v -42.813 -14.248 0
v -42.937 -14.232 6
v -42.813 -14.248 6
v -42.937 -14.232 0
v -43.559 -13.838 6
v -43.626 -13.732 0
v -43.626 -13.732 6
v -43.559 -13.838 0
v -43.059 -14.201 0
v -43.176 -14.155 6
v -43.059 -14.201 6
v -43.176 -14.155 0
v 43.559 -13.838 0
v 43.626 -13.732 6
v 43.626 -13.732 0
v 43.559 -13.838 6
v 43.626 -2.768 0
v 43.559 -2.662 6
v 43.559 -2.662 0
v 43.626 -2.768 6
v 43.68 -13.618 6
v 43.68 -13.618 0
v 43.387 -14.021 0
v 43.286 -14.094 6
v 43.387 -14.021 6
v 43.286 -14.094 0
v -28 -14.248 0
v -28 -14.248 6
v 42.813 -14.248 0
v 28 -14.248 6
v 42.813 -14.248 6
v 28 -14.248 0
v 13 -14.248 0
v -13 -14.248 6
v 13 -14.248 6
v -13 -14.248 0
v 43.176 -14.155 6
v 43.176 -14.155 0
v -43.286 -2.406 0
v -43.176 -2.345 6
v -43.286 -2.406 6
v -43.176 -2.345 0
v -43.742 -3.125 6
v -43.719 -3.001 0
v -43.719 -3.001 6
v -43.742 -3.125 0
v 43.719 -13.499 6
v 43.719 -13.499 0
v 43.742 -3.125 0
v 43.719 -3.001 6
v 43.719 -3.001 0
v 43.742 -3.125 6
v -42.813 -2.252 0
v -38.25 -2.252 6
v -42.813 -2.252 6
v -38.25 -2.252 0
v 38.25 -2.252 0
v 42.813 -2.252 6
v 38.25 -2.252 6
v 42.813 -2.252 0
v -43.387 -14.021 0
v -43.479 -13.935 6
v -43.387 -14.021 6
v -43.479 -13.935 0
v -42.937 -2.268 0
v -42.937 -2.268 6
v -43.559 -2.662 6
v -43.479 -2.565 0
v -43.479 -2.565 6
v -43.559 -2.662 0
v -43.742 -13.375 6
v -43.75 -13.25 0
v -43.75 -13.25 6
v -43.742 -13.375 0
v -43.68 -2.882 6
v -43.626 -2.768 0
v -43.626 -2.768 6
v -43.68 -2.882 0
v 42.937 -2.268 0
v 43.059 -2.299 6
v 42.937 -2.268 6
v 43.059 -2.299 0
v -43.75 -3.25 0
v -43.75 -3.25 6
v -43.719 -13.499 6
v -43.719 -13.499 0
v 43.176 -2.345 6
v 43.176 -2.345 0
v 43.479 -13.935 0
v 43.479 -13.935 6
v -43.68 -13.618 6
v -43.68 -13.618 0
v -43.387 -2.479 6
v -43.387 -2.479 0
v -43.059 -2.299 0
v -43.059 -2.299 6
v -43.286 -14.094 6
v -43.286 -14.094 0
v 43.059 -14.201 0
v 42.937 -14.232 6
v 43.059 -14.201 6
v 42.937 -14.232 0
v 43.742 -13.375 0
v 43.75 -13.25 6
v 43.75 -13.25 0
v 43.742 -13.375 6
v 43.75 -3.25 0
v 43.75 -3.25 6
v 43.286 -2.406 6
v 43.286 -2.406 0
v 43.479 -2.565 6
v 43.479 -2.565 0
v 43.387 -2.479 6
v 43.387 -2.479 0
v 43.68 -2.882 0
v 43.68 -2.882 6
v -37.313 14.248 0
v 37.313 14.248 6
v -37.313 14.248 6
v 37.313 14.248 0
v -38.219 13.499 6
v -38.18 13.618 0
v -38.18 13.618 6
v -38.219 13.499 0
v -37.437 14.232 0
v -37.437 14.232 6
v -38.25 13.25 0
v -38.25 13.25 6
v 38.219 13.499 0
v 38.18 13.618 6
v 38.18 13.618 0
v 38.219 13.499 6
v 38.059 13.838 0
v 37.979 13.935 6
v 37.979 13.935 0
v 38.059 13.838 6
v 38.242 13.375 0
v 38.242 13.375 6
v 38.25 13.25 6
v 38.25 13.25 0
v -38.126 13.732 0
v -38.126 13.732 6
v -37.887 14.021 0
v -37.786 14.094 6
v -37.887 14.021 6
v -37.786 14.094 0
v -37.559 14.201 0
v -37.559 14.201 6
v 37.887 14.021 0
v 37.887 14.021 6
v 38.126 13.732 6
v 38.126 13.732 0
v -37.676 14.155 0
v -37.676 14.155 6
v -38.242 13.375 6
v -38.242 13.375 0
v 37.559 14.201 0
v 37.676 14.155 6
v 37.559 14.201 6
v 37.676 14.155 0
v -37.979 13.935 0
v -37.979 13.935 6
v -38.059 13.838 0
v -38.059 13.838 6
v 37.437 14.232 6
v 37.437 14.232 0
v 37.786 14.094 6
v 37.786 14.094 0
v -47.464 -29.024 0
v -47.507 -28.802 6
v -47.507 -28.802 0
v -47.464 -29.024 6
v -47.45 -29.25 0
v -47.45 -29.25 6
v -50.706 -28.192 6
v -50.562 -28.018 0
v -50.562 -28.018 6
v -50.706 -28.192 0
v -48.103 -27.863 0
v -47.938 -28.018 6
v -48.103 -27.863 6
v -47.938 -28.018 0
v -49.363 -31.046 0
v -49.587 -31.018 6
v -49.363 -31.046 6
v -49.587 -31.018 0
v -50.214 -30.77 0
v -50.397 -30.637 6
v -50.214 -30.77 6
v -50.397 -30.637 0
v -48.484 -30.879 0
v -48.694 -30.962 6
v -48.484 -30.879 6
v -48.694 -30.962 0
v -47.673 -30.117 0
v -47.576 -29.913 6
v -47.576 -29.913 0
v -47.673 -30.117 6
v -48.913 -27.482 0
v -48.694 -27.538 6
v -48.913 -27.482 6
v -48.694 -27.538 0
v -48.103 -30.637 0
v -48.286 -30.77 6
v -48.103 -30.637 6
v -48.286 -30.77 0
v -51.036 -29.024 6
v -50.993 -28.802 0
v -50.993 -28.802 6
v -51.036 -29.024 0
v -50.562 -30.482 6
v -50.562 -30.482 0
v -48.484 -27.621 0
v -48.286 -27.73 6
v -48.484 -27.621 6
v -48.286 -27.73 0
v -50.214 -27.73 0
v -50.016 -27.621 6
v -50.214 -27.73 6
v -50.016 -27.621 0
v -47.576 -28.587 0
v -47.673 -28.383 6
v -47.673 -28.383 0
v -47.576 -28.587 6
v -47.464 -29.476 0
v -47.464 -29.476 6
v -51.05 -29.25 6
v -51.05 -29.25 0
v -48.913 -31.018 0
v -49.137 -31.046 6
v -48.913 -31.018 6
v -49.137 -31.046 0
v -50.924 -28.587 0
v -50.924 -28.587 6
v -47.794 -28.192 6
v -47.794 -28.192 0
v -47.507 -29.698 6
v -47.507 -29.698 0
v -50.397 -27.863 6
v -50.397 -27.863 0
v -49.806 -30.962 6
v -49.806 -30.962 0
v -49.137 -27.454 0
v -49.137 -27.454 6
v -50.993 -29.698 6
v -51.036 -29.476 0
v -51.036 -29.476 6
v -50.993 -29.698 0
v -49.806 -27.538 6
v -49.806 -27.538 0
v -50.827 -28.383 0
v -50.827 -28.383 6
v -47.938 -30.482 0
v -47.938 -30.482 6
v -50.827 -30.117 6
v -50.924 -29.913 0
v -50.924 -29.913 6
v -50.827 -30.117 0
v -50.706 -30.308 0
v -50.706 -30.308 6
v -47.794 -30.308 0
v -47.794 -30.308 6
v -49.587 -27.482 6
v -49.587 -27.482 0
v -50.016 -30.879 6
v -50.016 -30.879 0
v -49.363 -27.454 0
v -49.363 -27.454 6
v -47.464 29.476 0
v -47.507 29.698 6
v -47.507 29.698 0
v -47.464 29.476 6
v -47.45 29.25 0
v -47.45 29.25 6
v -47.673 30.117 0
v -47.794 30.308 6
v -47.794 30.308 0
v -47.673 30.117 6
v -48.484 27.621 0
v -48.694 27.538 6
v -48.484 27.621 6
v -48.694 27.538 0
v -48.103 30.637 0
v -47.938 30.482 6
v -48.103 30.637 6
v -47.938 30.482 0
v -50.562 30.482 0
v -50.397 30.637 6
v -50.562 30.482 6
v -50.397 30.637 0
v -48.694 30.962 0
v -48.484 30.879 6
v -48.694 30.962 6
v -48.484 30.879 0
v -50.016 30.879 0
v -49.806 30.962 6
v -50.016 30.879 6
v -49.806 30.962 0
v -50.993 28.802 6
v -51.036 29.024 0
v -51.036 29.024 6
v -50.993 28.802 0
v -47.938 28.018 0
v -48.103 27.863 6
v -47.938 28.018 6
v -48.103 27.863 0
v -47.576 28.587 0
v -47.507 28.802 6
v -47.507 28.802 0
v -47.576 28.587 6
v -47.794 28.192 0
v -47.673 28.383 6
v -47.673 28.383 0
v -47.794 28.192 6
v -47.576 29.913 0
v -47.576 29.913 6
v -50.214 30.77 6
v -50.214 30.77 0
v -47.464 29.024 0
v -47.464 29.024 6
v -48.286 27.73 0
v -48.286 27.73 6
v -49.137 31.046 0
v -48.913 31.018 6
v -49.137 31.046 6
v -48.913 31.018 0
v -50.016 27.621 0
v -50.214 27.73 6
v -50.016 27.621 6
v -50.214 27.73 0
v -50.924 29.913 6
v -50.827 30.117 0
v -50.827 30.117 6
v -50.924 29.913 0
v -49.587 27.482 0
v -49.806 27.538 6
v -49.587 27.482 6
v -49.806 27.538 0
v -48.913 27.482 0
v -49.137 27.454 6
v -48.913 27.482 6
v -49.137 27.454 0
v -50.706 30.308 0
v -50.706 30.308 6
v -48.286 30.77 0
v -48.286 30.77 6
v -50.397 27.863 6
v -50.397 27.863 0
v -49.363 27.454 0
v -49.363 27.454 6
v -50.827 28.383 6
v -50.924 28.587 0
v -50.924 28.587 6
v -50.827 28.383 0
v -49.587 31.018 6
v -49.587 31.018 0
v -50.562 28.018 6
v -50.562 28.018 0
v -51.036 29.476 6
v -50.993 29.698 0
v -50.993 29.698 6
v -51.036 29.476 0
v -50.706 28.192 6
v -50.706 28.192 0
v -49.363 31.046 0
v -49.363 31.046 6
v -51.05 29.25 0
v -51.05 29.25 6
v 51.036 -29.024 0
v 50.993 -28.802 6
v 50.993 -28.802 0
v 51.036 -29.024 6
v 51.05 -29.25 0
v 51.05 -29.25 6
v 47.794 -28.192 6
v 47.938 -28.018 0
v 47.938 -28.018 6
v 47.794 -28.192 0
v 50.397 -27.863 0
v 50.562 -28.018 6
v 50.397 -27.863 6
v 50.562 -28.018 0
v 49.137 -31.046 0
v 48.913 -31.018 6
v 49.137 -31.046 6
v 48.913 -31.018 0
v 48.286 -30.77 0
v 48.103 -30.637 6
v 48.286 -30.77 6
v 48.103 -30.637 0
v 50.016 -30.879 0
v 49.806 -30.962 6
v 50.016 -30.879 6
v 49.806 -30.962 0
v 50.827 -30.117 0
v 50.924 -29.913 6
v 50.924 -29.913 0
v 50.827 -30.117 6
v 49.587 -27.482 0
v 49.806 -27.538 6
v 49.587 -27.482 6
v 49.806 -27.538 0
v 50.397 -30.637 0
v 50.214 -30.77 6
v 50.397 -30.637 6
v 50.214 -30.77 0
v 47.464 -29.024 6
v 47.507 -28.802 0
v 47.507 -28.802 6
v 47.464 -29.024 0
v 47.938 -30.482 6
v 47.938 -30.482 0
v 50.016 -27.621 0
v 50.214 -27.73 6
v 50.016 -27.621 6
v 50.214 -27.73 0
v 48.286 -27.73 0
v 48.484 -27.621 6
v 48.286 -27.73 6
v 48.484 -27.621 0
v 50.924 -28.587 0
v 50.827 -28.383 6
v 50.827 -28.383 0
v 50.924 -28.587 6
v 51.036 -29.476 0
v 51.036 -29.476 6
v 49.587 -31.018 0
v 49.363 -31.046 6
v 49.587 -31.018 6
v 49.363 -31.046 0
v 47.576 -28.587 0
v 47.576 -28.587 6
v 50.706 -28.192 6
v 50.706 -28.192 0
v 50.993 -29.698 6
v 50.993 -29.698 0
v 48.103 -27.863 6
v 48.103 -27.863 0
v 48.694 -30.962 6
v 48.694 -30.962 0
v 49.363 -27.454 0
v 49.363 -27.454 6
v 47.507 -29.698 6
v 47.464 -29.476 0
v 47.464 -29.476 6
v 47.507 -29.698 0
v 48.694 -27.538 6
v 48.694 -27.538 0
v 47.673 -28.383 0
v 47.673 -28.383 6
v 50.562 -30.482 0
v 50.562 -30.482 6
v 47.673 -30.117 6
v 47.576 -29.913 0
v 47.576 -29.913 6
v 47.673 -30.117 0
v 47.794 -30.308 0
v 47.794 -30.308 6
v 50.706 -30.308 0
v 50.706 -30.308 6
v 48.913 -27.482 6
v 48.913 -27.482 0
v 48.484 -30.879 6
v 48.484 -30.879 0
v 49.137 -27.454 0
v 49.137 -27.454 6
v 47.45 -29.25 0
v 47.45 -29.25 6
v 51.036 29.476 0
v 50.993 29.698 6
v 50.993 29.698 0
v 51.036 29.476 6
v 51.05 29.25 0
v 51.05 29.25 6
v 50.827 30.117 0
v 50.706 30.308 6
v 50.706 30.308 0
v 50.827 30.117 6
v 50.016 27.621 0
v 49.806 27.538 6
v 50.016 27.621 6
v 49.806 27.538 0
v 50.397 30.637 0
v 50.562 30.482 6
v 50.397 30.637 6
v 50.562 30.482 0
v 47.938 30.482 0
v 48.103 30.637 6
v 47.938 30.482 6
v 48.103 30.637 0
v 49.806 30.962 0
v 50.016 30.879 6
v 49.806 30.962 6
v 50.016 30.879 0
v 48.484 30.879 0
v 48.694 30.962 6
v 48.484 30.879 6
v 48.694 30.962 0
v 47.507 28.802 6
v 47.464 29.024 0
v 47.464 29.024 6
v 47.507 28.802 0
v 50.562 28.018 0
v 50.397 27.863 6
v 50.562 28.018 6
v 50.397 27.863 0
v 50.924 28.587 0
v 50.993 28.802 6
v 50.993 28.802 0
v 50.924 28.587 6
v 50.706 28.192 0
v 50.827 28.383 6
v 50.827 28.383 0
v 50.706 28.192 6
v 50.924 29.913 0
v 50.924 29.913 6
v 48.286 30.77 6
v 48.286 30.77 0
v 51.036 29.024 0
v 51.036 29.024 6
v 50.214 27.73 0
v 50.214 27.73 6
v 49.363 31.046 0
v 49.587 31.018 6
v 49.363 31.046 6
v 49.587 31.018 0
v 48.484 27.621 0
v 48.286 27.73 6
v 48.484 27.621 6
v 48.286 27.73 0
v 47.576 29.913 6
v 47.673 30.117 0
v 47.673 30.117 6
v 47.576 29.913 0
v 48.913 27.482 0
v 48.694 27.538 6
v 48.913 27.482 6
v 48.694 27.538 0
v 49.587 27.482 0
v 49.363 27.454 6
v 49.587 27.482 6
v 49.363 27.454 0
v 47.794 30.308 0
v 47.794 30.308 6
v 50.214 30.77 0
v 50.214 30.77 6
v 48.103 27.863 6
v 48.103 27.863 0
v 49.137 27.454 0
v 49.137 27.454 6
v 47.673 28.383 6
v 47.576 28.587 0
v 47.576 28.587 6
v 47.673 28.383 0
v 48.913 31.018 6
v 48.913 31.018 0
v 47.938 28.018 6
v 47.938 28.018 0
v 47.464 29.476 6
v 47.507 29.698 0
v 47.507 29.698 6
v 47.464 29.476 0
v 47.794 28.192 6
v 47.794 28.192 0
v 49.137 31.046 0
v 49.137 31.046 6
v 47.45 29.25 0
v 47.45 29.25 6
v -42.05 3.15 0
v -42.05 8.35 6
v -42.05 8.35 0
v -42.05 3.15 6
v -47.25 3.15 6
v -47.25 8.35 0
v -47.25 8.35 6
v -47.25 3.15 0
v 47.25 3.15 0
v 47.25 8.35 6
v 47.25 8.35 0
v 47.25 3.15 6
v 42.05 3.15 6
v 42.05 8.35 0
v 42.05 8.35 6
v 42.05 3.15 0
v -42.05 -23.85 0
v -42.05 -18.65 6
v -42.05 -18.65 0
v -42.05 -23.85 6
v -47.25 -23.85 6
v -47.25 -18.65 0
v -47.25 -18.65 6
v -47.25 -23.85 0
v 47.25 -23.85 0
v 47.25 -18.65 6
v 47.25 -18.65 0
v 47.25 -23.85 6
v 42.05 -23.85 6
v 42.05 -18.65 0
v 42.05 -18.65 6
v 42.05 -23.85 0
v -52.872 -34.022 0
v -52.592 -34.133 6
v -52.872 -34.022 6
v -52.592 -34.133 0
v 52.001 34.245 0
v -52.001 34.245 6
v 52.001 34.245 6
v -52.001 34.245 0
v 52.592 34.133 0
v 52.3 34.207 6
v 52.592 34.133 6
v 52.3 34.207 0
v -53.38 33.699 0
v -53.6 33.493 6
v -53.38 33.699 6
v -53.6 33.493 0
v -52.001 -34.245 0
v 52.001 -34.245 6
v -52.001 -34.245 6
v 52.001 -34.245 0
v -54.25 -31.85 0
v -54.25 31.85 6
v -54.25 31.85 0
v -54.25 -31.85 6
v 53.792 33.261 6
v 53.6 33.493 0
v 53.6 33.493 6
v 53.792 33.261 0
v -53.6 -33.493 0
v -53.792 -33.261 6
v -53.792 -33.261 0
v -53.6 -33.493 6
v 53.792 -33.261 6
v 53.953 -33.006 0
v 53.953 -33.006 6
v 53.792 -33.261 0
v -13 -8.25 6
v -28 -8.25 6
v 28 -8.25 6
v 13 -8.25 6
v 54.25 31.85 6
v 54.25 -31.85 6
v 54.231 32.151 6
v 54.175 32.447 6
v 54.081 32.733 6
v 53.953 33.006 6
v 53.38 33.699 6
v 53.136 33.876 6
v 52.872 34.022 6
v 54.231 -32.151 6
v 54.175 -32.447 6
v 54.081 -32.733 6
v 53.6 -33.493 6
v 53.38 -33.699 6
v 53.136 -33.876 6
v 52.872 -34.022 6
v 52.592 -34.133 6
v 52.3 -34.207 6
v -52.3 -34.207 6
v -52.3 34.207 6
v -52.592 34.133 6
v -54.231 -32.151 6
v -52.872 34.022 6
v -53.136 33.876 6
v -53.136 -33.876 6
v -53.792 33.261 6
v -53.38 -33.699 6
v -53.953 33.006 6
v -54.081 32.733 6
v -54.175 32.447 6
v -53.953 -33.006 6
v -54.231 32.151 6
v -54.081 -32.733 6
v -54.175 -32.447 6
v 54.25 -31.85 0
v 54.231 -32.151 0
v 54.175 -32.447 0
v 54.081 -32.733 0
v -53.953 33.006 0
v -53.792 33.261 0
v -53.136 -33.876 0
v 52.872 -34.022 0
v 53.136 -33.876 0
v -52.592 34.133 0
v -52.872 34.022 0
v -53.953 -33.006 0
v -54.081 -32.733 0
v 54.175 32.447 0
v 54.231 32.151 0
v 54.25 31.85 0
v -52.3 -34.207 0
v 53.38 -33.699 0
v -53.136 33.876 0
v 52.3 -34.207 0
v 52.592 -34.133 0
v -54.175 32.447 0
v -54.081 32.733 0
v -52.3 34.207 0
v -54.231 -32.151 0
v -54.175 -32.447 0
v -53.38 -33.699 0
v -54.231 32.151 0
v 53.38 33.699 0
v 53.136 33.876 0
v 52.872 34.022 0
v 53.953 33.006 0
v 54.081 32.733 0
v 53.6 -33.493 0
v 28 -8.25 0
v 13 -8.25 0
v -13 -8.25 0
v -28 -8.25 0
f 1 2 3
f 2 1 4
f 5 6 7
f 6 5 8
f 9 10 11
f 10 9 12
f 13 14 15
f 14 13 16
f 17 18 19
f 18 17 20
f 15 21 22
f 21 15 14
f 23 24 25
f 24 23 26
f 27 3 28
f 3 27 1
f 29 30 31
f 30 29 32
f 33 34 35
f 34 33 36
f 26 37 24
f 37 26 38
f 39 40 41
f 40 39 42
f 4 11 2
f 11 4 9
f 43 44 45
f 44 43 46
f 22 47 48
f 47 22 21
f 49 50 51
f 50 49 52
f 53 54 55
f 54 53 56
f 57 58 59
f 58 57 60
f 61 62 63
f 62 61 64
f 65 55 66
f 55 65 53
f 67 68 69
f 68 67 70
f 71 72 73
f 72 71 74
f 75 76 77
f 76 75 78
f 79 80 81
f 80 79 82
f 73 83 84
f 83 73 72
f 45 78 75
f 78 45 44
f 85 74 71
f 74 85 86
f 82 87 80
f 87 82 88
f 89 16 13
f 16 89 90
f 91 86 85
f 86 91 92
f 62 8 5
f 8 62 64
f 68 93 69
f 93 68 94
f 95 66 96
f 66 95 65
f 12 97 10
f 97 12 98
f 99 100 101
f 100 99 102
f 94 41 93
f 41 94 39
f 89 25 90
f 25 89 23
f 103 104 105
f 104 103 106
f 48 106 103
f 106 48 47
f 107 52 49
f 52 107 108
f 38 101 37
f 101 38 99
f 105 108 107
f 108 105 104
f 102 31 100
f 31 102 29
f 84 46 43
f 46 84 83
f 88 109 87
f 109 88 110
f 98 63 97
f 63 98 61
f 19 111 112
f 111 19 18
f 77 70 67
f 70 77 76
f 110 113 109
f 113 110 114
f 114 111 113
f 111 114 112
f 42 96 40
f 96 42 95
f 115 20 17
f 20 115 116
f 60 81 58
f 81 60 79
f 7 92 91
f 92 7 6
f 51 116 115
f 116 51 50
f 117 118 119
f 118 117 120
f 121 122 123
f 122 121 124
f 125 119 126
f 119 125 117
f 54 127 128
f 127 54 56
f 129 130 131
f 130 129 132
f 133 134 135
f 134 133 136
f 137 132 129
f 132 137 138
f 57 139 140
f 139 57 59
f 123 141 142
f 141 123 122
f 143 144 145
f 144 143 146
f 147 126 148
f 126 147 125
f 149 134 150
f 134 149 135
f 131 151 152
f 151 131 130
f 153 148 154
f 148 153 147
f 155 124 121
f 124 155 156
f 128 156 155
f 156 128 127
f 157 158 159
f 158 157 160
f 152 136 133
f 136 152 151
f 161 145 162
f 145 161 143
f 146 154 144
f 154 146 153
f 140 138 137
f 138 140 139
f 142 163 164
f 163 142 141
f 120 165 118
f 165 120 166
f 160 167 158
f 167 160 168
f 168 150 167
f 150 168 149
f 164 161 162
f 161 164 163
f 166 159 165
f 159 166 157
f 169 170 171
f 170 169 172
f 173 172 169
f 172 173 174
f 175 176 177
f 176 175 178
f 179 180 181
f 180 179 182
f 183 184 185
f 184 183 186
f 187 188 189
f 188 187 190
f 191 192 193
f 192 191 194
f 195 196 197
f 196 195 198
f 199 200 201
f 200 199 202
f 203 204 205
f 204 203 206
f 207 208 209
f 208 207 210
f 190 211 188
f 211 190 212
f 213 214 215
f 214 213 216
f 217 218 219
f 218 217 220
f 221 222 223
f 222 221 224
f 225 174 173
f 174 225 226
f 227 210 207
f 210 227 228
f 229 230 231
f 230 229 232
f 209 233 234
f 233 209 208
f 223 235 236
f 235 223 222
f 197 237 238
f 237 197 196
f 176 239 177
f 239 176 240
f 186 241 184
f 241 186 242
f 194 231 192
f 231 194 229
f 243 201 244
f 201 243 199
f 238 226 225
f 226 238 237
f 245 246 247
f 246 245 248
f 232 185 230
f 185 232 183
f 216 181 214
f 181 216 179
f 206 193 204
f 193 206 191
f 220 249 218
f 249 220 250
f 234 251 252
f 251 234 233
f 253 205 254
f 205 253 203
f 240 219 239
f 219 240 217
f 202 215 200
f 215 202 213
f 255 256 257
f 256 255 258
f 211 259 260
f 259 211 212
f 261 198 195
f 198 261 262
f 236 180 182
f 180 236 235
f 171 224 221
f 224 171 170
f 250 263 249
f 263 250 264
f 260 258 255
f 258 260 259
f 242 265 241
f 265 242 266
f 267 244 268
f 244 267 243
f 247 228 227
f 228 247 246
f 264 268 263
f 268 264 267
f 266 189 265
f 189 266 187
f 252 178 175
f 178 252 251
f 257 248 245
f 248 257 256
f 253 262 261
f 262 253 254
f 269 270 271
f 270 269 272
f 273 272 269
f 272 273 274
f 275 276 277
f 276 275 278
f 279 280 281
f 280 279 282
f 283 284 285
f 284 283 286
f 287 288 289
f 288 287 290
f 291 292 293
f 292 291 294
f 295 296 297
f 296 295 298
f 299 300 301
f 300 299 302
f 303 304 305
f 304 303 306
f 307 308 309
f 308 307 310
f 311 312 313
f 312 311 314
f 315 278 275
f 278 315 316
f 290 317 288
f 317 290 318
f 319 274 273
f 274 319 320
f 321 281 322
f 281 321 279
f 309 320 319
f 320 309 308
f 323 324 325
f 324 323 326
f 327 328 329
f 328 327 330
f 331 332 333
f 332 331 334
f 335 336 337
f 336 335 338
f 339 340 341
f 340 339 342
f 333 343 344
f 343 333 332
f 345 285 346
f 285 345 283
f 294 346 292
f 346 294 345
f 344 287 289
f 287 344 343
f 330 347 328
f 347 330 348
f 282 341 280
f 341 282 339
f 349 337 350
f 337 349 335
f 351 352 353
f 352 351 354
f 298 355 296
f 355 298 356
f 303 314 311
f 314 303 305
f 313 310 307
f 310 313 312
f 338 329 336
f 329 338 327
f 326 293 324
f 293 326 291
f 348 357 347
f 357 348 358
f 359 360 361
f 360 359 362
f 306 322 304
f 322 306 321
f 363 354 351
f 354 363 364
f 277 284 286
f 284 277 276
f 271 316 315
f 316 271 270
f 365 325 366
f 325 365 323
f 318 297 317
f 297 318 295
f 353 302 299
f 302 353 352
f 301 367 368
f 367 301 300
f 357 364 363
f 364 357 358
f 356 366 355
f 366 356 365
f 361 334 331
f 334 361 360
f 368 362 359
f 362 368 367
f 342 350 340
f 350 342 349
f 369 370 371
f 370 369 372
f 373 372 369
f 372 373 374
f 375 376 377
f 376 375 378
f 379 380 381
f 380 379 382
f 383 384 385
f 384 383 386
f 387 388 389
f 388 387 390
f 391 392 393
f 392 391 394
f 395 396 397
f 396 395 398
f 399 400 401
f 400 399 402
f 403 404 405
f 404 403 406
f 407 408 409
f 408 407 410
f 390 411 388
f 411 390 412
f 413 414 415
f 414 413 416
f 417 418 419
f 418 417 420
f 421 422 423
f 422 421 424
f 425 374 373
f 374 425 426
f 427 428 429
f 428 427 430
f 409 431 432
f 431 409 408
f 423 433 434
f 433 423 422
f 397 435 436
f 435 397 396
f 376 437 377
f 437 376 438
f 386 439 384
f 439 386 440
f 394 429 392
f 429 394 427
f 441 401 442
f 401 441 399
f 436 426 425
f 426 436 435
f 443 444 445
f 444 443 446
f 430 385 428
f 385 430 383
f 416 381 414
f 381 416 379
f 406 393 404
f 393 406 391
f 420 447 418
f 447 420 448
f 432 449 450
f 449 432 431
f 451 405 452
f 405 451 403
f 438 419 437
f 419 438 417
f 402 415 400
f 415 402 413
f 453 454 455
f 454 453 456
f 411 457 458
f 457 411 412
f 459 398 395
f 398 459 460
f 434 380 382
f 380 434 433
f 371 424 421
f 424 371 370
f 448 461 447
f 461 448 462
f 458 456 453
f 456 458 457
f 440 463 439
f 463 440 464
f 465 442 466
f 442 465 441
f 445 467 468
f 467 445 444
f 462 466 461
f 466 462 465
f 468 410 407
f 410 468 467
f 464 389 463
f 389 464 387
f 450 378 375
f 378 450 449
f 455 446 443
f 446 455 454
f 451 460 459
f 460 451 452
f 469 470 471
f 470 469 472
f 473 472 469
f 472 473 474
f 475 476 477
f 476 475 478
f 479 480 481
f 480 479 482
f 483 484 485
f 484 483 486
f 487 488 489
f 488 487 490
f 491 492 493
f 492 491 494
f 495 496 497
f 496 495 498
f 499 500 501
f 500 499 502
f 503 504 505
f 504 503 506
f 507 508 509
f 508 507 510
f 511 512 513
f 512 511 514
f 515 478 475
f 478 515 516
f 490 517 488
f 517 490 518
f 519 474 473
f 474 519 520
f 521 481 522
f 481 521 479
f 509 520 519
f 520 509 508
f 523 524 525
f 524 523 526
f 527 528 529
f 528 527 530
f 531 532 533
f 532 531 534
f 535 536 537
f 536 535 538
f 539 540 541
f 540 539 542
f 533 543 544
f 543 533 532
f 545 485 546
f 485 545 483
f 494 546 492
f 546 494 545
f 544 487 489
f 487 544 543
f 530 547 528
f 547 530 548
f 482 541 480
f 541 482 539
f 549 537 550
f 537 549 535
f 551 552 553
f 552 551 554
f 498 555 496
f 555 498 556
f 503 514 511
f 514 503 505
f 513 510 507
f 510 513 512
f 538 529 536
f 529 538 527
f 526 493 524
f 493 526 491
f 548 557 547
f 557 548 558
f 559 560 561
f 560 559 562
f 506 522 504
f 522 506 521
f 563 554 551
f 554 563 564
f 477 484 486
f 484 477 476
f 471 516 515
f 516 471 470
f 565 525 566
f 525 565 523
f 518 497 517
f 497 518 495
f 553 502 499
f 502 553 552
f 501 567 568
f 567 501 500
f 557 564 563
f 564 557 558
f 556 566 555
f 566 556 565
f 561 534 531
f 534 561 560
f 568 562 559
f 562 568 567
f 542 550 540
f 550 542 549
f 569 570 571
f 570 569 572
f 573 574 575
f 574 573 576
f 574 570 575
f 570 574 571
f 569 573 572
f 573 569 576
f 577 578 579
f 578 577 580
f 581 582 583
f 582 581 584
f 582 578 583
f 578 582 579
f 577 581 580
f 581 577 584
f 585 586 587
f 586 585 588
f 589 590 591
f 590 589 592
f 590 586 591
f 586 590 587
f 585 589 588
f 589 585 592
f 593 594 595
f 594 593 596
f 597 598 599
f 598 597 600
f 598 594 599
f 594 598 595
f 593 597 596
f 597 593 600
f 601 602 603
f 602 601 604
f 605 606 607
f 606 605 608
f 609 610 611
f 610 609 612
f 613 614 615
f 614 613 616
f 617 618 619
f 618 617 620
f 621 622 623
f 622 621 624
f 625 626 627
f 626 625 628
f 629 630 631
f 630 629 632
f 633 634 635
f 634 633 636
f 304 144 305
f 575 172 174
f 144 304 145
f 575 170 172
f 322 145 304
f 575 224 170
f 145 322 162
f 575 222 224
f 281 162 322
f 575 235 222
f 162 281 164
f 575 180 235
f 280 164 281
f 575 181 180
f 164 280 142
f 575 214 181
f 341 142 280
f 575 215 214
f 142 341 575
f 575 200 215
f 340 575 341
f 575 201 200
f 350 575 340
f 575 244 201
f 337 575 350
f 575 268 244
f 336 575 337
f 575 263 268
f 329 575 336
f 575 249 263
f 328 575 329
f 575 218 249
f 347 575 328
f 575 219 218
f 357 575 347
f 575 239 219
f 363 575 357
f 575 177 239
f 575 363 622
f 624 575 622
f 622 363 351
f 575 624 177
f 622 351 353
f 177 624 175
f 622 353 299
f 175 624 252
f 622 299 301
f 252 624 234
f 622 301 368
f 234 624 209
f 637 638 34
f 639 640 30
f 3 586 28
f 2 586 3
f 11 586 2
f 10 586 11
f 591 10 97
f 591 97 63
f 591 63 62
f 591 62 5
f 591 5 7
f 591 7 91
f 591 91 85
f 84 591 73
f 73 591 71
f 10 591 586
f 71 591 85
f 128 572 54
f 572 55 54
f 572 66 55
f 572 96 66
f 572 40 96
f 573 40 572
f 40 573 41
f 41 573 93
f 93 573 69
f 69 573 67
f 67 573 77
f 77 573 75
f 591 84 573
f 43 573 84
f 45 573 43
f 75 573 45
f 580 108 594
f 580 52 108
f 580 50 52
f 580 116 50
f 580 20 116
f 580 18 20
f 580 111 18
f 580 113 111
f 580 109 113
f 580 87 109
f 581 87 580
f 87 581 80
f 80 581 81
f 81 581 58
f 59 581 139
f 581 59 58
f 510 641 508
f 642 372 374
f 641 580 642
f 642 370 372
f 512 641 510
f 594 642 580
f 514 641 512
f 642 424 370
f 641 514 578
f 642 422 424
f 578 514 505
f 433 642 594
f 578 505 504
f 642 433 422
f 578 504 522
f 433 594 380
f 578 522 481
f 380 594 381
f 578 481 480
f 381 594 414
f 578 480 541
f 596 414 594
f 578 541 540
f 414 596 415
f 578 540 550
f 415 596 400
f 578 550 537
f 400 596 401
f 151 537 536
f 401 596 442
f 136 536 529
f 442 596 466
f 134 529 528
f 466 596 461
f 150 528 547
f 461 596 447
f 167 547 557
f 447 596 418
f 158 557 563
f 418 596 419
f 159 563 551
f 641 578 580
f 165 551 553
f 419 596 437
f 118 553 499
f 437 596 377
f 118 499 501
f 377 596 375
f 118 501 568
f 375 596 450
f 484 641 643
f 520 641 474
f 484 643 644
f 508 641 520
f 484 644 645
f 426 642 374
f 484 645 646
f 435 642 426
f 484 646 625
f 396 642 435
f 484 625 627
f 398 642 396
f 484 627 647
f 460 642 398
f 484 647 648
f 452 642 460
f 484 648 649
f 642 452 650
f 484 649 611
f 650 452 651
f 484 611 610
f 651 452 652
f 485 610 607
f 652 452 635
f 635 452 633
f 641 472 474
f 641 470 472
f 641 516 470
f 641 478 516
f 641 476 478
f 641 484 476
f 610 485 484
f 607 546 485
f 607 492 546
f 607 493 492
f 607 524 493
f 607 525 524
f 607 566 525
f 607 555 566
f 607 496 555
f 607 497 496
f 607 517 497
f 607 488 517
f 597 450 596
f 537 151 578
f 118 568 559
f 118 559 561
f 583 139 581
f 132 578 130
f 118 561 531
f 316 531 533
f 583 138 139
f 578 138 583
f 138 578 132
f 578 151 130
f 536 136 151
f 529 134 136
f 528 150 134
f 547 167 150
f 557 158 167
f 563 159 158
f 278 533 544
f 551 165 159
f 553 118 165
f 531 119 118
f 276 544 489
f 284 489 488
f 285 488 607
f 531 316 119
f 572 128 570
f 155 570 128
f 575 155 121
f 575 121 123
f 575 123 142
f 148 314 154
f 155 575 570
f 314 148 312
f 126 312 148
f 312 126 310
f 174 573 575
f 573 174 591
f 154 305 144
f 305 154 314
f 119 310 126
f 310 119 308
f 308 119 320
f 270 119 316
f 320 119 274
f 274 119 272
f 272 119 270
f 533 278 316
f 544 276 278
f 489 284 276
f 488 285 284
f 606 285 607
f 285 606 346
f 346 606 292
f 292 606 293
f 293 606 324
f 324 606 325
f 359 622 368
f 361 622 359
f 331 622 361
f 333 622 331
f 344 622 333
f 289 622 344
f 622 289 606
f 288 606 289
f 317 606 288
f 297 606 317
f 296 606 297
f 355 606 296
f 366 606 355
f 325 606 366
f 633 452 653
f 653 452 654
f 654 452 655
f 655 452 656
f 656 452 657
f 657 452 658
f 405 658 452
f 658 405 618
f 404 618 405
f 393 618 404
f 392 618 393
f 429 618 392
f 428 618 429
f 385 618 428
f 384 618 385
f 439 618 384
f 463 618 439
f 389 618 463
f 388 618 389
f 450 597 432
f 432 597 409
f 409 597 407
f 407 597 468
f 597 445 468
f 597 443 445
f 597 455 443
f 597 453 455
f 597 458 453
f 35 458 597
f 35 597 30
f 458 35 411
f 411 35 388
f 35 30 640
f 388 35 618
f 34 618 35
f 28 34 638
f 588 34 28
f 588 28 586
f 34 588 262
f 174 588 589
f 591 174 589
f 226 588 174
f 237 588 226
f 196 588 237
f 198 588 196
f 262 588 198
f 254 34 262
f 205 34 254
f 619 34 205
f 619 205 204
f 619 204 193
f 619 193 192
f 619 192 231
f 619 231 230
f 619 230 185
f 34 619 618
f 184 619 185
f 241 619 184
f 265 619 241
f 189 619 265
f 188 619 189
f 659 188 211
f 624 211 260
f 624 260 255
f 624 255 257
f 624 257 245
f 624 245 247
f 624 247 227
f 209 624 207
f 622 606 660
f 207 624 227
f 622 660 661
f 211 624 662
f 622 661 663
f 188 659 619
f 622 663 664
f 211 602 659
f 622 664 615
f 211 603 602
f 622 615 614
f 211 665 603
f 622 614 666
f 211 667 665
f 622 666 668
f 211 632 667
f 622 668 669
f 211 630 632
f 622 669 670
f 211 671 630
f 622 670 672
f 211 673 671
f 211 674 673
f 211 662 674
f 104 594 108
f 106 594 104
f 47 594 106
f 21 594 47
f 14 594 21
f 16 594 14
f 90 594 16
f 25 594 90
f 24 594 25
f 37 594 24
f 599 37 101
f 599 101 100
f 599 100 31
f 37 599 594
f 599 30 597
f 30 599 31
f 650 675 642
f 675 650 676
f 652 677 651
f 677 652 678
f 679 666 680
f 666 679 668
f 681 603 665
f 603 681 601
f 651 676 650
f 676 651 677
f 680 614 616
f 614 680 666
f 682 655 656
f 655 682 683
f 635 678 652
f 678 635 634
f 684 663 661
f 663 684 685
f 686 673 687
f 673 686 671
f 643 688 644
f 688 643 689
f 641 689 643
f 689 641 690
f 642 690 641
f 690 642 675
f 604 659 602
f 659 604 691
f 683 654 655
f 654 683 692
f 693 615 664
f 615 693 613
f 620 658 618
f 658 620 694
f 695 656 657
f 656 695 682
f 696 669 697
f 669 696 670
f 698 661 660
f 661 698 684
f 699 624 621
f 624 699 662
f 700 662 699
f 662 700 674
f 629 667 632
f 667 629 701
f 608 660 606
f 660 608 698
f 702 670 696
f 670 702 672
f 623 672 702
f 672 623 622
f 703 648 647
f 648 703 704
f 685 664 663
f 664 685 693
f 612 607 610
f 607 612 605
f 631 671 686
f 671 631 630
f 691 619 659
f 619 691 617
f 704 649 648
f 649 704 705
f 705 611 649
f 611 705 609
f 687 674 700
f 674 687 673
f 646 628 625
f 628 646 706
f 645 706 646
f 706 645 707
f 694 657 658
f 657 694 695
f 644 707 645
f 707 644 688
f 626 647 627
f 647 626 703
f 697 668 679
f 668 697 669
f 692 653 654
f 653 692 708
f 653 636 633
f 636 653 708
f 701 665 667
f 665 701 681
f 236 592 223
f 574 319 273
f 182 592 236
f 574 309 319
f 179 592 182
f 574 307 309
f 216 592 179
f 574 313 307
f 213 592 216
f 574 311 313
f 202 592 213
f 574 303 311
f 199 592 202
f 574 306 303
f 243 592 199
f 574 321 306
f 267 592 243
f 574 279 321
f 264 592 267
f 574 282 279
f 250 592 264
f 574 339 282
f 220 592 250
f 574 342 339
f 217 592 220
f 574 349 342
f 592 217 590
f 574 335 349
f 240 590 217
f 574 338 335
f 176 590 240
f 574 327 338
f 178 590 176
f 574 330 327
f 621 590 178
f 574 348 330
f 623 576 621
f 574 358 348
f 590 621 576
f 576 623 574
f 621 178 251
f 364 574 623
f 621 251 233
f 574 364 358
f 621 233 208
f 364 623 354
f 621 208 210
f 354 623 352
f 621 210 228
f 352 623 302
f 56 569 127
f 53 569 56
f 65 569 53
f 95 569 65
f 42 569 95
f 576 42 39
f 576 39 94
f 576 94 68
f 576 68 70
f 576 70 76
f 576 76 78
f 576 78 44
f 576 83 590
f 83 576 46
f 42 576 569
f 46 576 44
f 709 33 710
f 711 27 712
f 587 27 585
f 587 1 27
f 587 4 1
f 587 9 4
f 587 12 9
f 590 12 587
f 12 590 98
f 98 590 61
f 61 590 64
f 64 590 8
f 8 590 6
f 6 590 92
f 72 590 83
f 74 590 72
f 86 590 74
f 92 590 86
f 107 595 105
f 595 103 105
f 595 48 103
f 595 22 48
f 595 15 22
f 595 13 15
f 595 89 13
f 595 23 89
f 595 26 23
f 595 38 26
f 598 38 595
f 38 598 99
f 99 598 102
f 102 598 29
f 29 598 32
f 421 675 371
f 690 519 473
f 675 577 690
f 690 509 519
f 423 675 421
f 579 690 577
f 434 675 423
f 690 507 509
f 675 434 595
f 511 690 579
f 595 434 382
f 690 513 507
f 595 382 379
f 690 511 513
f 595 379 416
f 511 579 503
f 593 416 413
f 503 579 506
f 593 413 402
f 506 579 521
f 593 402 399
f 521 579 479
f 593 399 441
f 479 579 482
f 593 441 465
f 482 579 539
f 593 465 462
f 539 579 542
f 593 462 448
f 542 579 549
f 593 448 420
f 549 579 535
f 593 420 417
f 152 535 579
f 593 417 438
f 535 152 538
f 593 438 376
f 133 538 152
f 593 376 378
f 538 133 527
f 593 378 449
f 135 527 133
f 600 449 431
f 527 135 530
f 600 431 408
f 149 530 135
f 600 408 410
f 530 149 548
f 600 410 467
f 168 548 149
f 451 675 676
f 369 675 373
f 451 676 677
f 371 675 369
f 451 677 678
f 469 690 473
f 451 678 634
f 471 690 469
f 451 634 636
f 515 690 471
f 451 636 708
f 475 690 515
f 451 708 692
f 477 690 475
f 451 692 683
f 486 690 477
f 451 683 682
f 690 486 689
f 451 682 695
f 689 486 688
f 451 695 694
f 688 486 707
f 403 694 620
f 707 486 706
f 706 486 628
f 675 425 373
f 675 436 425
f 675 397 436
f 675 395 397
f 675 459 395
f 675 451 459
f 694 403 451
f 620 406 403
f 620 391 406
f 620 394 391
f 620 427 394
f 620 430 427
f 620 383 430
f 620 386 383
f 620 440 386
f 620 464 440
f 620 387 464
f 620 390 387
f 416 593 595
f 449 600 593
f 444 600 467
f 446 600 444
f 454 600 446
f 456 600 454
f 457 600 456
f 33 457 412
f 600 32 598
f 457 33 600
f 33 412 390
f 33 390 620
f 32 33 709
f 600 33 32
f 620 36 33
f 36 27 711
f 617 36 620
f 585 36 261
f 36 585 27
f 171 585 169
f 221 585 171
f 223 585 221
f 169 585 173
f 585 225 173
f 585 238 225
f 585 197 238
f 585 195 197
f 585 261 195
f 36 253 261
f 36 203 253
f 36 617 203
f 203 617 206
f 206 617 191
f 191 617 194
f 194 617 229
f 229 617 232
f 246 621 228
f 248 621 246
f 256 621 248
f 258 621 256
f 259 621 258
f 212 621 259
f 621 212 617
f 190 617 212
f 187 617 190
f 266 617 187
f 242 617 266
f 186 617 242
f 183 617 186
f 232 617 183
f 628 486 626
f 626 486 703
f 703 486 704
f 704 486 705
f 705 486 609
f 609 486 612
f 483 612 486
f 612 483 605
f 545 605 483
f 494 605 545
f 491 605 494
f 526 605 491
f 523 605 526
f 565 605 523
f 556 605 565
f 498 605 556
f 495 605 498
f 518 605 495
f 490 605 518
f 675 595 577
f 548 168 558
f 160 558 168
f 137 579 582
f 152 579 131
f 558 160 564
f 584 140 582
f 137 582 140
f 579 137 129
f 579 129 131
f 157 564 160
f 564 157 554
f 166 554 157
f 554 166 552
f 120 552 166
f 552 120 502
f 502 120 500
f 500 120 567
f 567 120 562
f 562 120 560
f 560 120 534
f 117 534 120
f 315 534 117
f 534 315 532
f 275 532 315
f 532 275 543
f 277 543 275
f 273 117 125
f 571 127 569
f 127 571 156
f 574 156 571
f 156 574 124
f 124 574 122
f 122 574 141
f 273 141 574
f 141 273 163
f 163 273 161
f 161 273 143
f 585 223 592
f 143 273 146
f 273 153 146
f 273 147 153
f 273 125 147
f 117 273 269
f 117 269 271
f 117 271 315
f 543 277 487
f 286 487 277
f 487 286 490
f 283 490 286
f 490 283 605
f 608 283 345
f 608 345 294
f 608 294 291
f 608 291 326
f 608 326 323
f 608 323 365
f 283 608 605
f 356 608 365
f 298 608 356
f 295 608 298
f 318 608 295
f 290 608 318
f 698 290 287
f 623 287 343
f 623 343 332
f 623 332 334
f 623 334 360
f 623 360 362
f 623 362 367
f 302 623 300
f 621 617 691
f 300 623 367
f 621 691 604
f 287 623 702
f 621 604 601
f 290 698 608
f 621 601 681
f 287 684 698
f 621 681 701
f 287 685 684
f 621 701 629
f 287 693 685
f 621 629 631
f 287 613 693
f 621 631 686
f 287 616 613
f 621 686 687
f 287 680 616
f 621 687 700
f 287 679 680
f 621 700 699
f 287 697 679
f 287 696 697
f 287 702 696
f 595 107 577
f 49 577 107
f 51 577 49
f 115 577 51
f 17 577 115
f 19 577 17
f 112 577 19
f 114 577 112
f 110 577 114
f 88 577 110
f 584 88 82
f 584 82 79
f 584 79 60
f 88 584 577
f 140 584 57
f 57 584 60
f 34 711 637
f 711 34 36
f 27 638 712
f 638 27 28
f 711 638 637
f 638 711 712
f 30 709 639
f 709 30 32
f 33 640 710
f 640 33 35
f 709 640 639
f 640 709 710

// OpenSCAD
$fn = 50;

difference() {
	union() {
		translate(v = [0, 0, 0]) {
			rotate(a = [0, 0, 0]) {
				difference() {
					union() {
						translate(v = [0, 0, 0]) {
							rotate(a = [0, 0, 0]) {
								difference() {
									union() {
										hull() {
											translate(v = [-51.85, 31.85, 0]) {
												cylinder(h = 6.0, r = 2.4);
											}
											translate(v = [51.85, 31.85, 0]) {
												cylinder(h = 6.0, r = 2.4);
											}
											translate(v = [-51.85, -31.85, 0]) {
												cylinder(h = 6.0, r = 2.4);
											}
											translate(v = [51.85, -31.85, 0]) {
												cylinder(h = 6.0, r = 2.4);
											}
										}
									}
									union() {
										translate(v = [0.0, -8.25, -0.1]) {
											hull() {
												translate(v = [-42.75, 5.0, 0]) {
													cylinder(h = 18.2, r = 1.0);
												}
												translate(v = [42.75, 5.0, 0]) {
													cylinder(h = 18.2, r = 1.0);
												}
												translate(v = [-42.75, -5.0, 0]) {
													cylinder(h = 18.2, r = 1.0);
												}
												translate(v = [42.75, -5.0, 0]) {
													cylinder(h = 18.2, r = 1.0);
												}
											}
										}
										translate(v = [0.0, 0.0, -0.1]) {
											hull() {
												translate(v = [-37.25, 13.25, 0]) {
													cylinder(h = 18.2, r = 1.0);
												}
												translate(v = [37.25, 13.25, 0]) {
													cylinder(h = 18.2, r = 1.0);
												}
												translate(v = [-37.25, -13.25, 0]) {
													cylinder(h = 18.2, r = 1.0);
												}
												translate(v = [37.25, -13.25, 0]) {
													cylinder(h = 18.2, r = 1.0);
												}
											}
										}
										translate(v = [-49.25, -29.25, -0.1]) {
											cylinder(h = 6.2, r = 1.8);
										}
										translate(v = [-49.25, 29.25, -0.1]) {
											cylinder(h = 6.2, r = 1.8);
										}
										translate(v = [49.25, -29.25, -0.1]) {
											cylinder(h = 6.2, r = 1.8);
										}
										translate(v = [49.25, 29.25, -0.1]) {
											cylinder(h = 6.2, r = 1.8);
										}
										translate(v = [-47.25, 3.15, -0.1]) {
											cube(size = [5.2, 5.2, 6.2]);
										}
										translate(v = [42.05, 3.15, -0.1]) {
											cube(size = [5.2, 5.2, 6.2]);
										}
										translate(v = [-47.25, -23.85, -0.1]) {
											cube(size = [5.2, 5.2, 6.2]);
										}
										translate(v = [42.05, -23.85, -0.1]) {
											cube(size = [5.2, 5.2, 6.2]);
										}
									}
								}
							}
						}
						translate(v = [0, 0, 0]) {
							rotate(a = [0, 0, 0]) {
								difference() {
									union() {
										translate(v = [-28.0, -16.05, 0]) {
											cube(size = [15.0, 7.8, 6.0]);
										}
									}
									union();
								}
							}
						}
						translate(v = [0, 0, 0]) {
							rotate(a = [0, 0, 0]) {
								difference() {
									union() {
										translate(v = [13.0, -16.05, 0]) {
											cube(size = [15.0, 7.8, 6.0]);
										}
									}
									union();
								}
							}
						}
					}
					union();
				}
			}
		}
	}
	union();
}
